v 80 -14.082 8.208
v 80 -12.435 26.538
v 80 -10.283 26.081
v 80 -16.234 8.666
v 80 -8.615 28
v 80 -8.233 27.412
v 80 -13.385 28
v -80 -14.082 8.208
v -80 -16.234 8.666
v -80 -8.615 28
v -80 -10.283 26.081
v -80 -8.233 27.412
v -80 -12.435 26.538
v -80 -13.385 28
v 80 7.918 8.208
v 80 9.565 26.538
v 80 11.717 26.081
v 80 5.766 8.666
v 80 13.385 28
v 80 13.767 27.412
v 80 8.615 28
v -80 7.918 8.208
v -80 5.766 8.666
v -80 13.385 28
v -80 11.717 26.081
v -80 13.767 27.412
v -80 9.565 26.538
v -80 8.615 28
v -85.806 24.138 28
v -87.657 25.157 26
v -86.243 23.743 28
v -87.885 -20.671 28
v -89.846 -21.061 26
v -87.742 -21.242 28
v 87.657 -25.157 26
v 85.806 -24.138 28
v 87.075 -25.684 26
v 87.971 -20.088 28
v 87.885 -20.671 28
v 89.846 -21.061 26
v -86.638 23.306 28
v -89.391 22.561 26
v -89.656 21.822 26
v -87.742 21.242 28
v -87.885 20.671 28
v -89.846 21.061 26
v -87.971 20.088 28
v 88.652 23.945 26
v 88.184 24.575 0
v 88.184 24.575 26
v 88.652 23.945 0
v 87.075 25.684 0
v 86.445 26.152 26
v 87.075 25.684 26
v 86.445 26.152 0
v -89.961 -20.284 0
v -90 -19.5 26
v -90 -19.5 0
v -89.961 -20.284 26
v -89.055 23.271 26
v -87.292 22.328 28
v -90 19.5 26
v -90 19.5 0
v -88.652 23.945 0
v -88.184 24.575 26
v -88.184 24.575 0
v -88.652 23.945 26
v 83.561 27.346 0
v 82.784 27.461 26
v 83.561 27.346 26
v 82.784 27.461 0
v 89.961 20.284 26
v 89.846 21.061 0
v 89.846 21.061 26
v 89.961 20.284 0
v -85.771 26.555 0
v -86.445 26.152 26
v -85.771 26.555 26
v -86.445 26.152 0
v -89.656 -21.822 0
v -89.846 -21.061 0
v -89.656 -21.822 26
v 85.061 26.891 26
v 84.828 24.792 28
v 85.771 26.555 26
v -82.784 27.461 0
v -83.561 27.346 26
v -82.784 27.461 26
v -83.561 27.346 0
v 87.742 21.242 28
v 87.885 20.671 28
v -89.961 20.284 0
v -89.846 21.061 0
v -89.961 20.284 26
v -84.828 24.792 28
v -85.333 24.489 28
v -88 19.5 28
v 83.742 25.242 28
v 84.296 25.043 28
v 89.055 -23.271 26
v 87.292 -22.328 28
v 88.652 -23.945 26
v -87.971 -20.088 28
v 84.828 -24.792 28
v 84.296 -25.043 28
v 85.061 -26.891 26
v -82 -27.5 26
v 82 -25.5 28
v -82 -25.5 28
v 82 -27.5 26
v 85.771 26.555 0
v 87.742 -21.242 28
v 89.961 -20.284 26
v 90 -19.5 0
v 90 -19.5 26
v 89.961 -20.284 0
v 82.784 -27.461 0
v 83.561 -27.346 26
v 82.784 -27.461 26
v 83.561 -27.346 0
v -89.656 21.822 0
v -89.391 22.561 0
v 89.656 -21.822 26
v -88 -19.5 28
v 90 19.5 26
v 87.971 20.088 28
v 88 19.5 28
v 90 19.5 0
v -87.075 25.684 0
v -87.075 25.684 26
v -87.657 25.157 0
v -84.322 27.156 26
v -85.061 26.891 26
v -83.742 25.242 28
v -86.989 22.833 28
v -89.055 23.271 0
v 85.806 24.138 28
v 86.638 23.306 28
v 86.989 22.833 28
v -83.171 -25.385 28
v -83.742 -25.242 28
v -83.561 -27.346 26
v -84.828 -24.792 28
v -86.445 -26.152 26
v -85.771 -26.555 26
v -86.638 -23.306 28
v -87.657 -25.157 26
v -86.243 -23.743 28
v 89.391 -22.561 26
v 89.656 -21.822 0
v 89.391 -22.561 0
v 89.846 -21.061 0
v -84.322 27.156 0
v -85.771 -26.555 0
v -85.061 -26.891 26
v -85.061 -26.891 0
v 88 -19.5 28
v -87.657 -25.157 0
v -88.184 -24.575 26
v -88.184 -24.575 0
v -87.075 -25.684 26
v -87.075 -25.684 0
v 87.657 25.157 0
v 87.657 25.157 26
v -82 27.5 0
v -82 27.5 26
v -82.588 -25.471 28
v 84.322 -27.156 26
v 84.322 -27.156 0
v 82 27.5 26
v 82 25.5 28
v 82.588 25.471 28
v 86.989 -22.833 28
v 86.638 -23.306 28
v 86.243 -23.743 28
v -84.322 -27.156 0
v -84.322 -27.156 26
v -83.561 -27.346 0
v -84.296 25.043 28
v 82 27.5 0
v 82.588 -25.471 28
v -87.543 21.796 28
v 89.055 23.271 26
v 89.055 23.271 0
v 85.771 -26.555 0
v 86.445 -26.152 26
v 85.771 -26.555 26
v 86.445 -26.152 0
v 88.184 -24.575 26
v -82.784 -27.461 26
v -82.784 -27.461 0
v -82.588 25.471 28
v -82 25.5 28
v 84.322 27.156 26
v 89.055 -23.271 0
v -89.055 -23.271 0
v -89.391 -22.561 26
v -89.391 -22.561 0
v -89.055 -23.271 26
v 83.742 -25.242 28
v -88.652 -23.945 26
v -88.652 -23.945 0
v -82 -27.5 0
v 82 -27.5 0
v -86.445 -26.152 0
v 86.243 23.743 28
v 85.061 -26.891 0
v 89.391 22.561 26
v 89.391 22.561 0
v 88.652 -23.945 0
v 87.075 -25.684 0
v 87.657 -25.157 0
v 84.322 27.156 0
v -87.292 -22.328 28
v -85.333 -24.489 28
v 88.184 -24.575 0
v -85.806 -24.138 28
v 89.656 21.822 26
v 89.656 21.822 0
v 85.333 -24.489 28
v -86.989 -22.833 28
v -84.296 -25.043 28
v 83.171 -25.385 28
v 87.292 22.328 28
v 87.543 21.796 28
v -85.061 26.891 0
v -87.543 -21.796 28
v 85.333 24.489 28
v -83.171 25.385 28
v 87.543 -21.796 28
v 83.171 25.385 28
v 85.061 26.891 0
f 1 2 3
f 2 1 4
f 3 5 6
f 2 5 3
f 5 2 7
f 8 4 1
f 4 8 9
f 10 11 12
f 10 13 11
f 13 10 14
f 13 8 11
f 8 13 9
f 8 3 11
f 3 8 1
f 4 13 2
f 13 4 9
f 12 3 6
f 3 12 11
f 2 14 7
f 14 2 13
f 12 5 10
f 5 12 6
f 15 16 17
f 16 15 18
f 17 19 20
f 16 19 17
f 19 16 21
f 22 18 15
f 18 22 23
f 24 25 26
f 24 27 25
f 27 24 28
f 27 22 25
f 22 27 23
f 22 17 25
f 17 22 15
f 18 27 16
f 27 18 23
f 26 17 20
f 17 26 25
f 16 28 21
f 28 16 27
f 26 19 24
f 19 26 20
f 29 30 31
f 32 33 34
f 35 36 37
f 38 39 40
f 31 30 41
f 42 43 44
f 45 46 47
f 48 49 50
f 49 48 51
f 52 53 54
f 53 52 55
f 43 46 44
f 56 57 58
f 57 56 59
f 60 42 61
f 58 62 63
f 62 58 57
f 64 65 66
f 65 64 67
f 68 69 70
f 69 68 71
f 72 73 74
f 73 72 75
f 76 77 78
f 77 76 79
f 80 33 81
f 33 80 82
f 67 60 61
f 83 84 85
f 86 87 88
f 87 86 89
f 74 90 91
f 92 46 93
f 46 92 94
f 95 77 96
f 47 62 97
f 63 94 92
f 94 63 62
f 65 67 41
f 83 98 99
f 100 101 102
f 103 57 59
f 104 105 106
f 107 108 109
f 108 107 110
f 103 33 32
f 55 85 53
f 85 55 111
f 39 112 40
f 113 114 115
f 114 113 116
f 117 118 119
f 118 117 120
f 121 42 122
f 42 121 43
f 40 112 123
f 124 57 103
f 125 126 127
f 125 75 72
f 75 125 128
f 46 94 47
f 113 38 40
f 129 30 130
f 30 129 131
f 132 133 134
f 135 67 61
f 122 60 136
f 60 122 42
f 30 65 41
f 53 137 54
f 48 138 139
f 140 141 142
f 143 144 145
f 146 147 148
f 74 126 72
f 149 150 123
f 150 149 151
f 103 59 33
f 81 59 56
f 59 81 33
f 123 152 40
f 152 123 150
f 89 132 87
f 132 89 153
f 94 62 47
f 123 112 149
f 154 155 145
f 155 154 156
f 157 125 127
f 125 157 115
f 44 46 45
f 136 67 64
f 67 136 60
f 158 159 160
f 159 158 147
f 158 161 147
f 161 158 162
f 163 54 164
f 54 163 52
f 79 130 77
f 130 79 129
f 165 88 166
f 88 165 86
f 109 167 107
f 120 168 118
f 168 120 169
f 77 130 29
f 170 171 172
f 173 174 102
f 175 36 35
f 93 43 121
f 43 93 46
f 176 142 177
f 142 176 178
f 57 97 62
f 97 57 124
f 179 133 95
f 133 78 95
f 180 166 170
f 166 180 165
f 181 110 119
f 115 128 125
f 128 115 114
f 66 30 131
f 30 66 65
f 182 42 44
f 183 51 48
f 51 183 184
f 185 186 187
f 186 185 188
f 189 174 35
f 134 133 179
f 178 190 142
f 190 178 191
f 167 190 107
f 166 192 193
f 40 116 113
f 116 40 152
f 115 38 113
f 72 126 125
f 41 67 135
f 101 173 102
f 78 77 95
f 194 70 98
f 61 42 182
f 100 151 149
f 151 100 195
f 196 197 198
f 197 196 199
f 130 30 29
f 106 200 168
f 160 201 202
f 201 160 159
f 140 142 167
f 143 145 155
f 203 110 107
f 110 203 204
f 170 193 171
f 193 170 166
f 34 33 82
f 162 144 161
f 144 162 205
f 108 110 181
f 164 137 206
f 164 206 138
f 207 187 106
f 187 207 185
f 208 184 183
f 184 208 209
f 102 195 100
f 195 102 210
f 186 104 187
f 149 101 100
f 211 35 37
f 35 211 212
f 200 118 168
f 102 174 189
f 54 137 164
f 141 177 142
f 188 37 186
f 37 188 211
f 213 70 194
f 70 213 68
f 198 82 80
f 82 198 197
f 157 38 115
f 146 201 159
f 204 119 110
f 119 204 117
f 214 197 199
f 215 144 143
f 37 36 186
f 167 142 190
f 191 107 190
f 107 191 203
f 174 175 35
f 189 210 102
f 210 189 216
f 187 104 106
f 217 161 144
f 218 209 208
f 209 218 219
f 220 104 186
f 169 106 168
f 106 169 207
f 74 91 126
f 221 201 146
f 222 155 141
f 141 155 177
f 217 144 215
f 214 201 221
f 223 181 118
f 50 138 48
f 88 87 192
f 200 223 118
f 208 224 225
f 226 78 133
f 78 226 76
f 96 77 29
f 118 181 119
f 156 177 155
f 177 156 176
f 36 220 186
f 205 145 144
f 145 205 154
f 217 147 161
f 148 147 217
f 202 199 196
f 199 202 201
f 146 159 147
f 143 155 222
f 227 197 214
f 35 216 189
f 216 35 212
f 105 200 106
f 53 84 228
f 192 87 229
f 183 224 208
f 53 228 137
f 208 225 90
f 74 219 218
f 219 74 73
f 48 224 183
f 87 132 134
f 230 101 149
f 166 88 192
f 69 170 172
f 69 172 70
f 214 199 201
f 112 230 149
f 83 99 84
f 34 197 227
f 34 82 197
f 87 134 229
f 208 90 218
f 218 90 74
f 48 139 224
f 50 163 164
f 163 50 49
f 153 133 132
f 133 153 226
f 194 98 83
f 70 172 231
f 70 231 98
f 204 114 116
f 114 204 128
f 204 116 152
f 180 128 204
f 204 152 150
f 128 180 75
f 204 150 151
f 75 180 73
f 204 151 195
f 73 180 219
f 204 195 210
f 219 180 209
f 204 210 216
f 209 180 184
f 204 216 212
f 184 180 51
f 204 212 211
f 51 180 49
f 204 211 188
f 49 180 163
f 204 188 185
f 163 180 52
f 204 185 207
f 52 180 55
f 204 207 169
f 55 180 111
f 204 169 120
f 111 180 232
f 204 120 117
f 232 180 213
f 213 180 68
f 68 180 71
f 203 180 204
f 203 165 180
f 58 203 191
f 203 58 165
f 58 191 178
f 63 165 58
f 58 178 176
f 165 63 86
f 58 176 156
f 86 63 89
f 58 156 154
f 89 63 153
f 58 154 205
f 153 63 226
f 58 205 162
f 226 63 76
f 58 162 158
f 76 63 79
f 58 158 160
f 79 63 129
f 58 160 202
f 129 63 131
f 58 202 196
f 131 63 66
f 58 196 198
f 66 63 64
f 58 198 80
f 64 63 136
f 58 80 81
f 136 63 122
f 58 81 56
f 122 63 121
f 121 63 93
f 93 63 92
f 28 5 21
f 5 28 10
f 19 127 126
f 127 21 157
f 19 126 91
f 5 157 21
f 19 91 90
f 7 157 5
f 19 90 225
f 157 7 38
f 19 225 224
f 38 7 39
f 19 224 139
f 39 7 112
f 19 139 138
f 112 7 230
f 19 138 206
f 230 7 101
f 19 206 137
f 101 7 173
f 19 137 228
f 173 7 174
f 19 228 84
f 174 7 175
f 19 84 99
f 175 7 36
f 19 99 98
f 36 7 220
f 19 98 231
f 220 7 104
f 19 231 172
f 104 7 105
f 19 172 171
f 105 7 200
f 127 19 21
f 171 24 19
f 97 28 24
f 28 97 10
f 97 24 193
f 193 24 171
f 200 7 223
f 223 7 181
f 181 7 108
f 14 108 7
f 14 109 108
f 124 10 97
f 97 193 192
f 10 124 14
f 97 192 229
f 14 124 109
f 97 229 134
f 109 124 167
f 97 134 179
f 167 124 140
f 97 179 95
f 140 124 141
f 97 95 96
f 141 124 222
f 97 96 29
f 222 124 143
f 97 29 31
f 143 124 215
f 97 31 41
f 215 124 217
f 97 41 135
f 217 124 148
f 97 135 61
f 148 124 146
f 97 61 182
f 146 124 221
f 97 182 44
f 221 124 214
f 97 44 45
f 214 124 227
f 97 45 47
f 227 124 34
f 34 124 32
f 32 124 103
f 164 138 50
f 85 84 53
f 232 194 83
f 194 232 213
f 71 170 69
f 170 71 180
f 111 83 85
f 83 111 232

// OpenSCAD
// Playing card holder (Spielkartenhalter) - parametric, all dimensions in mm.
// Holds a hand of cards upright and slightly tilted so cards can be played with
// one hand, with weak grip or tremor. Print flat, no supports.

holder_length = 180;   // total length
holder_depth  = 55;    // front-to-back depth
holder_height = 28;    // height of the block
slots         = 2;     // 1 or 2 slot rows
slot_width    = 2.2;   // slot gap (more for thicker card stacks)
slot_depth    = 20;    // how deep the cards sit
slot_angle    = 12;    // backward tilt of the cards in degrees
end_margin    = 10;    // closed ends of the slots
corner_radius = 8;
chamfer       = 2;

$fn = 64;

c = min(chamfer, holder_height / 4);

module outline(off = 0)
    translate([-holder_length / 2, -holder_depth / 2])
        offset(r = corner_radius + off) offset(delta = -corner_radius)
            square([holder_length, holder_depth]);

module body() hull() {
    linear_extrude(height = holder_height) outline(-c);
    translate([0, 0, 0]) linear_extrude(height = holder_height - c) outline(0);
}

function row_y(i) = slots == 1 ? 0 : -holder_depth * 0.2 + i * holder_depth * 0.4;

difference() {
    body();
    for (i = [0 : slots - 1]) {
        sl = holder_length - 2 * end_margin;
        translate([-sl / 2, row_y(i), holder_height])
            rotate([-slot_angle, 0, 0]) {
                translate([0, -slot_width / 2, -slot_depth]) cube([sl, slot_width, slot_depth + 10]);
                // lead-in V at the top of the slot
                translate([0, 0, 0]) rotate([45, 0, 0]) translate([0, -2, -2]) cube([sl, 4, 4]);
            }
    }
}
